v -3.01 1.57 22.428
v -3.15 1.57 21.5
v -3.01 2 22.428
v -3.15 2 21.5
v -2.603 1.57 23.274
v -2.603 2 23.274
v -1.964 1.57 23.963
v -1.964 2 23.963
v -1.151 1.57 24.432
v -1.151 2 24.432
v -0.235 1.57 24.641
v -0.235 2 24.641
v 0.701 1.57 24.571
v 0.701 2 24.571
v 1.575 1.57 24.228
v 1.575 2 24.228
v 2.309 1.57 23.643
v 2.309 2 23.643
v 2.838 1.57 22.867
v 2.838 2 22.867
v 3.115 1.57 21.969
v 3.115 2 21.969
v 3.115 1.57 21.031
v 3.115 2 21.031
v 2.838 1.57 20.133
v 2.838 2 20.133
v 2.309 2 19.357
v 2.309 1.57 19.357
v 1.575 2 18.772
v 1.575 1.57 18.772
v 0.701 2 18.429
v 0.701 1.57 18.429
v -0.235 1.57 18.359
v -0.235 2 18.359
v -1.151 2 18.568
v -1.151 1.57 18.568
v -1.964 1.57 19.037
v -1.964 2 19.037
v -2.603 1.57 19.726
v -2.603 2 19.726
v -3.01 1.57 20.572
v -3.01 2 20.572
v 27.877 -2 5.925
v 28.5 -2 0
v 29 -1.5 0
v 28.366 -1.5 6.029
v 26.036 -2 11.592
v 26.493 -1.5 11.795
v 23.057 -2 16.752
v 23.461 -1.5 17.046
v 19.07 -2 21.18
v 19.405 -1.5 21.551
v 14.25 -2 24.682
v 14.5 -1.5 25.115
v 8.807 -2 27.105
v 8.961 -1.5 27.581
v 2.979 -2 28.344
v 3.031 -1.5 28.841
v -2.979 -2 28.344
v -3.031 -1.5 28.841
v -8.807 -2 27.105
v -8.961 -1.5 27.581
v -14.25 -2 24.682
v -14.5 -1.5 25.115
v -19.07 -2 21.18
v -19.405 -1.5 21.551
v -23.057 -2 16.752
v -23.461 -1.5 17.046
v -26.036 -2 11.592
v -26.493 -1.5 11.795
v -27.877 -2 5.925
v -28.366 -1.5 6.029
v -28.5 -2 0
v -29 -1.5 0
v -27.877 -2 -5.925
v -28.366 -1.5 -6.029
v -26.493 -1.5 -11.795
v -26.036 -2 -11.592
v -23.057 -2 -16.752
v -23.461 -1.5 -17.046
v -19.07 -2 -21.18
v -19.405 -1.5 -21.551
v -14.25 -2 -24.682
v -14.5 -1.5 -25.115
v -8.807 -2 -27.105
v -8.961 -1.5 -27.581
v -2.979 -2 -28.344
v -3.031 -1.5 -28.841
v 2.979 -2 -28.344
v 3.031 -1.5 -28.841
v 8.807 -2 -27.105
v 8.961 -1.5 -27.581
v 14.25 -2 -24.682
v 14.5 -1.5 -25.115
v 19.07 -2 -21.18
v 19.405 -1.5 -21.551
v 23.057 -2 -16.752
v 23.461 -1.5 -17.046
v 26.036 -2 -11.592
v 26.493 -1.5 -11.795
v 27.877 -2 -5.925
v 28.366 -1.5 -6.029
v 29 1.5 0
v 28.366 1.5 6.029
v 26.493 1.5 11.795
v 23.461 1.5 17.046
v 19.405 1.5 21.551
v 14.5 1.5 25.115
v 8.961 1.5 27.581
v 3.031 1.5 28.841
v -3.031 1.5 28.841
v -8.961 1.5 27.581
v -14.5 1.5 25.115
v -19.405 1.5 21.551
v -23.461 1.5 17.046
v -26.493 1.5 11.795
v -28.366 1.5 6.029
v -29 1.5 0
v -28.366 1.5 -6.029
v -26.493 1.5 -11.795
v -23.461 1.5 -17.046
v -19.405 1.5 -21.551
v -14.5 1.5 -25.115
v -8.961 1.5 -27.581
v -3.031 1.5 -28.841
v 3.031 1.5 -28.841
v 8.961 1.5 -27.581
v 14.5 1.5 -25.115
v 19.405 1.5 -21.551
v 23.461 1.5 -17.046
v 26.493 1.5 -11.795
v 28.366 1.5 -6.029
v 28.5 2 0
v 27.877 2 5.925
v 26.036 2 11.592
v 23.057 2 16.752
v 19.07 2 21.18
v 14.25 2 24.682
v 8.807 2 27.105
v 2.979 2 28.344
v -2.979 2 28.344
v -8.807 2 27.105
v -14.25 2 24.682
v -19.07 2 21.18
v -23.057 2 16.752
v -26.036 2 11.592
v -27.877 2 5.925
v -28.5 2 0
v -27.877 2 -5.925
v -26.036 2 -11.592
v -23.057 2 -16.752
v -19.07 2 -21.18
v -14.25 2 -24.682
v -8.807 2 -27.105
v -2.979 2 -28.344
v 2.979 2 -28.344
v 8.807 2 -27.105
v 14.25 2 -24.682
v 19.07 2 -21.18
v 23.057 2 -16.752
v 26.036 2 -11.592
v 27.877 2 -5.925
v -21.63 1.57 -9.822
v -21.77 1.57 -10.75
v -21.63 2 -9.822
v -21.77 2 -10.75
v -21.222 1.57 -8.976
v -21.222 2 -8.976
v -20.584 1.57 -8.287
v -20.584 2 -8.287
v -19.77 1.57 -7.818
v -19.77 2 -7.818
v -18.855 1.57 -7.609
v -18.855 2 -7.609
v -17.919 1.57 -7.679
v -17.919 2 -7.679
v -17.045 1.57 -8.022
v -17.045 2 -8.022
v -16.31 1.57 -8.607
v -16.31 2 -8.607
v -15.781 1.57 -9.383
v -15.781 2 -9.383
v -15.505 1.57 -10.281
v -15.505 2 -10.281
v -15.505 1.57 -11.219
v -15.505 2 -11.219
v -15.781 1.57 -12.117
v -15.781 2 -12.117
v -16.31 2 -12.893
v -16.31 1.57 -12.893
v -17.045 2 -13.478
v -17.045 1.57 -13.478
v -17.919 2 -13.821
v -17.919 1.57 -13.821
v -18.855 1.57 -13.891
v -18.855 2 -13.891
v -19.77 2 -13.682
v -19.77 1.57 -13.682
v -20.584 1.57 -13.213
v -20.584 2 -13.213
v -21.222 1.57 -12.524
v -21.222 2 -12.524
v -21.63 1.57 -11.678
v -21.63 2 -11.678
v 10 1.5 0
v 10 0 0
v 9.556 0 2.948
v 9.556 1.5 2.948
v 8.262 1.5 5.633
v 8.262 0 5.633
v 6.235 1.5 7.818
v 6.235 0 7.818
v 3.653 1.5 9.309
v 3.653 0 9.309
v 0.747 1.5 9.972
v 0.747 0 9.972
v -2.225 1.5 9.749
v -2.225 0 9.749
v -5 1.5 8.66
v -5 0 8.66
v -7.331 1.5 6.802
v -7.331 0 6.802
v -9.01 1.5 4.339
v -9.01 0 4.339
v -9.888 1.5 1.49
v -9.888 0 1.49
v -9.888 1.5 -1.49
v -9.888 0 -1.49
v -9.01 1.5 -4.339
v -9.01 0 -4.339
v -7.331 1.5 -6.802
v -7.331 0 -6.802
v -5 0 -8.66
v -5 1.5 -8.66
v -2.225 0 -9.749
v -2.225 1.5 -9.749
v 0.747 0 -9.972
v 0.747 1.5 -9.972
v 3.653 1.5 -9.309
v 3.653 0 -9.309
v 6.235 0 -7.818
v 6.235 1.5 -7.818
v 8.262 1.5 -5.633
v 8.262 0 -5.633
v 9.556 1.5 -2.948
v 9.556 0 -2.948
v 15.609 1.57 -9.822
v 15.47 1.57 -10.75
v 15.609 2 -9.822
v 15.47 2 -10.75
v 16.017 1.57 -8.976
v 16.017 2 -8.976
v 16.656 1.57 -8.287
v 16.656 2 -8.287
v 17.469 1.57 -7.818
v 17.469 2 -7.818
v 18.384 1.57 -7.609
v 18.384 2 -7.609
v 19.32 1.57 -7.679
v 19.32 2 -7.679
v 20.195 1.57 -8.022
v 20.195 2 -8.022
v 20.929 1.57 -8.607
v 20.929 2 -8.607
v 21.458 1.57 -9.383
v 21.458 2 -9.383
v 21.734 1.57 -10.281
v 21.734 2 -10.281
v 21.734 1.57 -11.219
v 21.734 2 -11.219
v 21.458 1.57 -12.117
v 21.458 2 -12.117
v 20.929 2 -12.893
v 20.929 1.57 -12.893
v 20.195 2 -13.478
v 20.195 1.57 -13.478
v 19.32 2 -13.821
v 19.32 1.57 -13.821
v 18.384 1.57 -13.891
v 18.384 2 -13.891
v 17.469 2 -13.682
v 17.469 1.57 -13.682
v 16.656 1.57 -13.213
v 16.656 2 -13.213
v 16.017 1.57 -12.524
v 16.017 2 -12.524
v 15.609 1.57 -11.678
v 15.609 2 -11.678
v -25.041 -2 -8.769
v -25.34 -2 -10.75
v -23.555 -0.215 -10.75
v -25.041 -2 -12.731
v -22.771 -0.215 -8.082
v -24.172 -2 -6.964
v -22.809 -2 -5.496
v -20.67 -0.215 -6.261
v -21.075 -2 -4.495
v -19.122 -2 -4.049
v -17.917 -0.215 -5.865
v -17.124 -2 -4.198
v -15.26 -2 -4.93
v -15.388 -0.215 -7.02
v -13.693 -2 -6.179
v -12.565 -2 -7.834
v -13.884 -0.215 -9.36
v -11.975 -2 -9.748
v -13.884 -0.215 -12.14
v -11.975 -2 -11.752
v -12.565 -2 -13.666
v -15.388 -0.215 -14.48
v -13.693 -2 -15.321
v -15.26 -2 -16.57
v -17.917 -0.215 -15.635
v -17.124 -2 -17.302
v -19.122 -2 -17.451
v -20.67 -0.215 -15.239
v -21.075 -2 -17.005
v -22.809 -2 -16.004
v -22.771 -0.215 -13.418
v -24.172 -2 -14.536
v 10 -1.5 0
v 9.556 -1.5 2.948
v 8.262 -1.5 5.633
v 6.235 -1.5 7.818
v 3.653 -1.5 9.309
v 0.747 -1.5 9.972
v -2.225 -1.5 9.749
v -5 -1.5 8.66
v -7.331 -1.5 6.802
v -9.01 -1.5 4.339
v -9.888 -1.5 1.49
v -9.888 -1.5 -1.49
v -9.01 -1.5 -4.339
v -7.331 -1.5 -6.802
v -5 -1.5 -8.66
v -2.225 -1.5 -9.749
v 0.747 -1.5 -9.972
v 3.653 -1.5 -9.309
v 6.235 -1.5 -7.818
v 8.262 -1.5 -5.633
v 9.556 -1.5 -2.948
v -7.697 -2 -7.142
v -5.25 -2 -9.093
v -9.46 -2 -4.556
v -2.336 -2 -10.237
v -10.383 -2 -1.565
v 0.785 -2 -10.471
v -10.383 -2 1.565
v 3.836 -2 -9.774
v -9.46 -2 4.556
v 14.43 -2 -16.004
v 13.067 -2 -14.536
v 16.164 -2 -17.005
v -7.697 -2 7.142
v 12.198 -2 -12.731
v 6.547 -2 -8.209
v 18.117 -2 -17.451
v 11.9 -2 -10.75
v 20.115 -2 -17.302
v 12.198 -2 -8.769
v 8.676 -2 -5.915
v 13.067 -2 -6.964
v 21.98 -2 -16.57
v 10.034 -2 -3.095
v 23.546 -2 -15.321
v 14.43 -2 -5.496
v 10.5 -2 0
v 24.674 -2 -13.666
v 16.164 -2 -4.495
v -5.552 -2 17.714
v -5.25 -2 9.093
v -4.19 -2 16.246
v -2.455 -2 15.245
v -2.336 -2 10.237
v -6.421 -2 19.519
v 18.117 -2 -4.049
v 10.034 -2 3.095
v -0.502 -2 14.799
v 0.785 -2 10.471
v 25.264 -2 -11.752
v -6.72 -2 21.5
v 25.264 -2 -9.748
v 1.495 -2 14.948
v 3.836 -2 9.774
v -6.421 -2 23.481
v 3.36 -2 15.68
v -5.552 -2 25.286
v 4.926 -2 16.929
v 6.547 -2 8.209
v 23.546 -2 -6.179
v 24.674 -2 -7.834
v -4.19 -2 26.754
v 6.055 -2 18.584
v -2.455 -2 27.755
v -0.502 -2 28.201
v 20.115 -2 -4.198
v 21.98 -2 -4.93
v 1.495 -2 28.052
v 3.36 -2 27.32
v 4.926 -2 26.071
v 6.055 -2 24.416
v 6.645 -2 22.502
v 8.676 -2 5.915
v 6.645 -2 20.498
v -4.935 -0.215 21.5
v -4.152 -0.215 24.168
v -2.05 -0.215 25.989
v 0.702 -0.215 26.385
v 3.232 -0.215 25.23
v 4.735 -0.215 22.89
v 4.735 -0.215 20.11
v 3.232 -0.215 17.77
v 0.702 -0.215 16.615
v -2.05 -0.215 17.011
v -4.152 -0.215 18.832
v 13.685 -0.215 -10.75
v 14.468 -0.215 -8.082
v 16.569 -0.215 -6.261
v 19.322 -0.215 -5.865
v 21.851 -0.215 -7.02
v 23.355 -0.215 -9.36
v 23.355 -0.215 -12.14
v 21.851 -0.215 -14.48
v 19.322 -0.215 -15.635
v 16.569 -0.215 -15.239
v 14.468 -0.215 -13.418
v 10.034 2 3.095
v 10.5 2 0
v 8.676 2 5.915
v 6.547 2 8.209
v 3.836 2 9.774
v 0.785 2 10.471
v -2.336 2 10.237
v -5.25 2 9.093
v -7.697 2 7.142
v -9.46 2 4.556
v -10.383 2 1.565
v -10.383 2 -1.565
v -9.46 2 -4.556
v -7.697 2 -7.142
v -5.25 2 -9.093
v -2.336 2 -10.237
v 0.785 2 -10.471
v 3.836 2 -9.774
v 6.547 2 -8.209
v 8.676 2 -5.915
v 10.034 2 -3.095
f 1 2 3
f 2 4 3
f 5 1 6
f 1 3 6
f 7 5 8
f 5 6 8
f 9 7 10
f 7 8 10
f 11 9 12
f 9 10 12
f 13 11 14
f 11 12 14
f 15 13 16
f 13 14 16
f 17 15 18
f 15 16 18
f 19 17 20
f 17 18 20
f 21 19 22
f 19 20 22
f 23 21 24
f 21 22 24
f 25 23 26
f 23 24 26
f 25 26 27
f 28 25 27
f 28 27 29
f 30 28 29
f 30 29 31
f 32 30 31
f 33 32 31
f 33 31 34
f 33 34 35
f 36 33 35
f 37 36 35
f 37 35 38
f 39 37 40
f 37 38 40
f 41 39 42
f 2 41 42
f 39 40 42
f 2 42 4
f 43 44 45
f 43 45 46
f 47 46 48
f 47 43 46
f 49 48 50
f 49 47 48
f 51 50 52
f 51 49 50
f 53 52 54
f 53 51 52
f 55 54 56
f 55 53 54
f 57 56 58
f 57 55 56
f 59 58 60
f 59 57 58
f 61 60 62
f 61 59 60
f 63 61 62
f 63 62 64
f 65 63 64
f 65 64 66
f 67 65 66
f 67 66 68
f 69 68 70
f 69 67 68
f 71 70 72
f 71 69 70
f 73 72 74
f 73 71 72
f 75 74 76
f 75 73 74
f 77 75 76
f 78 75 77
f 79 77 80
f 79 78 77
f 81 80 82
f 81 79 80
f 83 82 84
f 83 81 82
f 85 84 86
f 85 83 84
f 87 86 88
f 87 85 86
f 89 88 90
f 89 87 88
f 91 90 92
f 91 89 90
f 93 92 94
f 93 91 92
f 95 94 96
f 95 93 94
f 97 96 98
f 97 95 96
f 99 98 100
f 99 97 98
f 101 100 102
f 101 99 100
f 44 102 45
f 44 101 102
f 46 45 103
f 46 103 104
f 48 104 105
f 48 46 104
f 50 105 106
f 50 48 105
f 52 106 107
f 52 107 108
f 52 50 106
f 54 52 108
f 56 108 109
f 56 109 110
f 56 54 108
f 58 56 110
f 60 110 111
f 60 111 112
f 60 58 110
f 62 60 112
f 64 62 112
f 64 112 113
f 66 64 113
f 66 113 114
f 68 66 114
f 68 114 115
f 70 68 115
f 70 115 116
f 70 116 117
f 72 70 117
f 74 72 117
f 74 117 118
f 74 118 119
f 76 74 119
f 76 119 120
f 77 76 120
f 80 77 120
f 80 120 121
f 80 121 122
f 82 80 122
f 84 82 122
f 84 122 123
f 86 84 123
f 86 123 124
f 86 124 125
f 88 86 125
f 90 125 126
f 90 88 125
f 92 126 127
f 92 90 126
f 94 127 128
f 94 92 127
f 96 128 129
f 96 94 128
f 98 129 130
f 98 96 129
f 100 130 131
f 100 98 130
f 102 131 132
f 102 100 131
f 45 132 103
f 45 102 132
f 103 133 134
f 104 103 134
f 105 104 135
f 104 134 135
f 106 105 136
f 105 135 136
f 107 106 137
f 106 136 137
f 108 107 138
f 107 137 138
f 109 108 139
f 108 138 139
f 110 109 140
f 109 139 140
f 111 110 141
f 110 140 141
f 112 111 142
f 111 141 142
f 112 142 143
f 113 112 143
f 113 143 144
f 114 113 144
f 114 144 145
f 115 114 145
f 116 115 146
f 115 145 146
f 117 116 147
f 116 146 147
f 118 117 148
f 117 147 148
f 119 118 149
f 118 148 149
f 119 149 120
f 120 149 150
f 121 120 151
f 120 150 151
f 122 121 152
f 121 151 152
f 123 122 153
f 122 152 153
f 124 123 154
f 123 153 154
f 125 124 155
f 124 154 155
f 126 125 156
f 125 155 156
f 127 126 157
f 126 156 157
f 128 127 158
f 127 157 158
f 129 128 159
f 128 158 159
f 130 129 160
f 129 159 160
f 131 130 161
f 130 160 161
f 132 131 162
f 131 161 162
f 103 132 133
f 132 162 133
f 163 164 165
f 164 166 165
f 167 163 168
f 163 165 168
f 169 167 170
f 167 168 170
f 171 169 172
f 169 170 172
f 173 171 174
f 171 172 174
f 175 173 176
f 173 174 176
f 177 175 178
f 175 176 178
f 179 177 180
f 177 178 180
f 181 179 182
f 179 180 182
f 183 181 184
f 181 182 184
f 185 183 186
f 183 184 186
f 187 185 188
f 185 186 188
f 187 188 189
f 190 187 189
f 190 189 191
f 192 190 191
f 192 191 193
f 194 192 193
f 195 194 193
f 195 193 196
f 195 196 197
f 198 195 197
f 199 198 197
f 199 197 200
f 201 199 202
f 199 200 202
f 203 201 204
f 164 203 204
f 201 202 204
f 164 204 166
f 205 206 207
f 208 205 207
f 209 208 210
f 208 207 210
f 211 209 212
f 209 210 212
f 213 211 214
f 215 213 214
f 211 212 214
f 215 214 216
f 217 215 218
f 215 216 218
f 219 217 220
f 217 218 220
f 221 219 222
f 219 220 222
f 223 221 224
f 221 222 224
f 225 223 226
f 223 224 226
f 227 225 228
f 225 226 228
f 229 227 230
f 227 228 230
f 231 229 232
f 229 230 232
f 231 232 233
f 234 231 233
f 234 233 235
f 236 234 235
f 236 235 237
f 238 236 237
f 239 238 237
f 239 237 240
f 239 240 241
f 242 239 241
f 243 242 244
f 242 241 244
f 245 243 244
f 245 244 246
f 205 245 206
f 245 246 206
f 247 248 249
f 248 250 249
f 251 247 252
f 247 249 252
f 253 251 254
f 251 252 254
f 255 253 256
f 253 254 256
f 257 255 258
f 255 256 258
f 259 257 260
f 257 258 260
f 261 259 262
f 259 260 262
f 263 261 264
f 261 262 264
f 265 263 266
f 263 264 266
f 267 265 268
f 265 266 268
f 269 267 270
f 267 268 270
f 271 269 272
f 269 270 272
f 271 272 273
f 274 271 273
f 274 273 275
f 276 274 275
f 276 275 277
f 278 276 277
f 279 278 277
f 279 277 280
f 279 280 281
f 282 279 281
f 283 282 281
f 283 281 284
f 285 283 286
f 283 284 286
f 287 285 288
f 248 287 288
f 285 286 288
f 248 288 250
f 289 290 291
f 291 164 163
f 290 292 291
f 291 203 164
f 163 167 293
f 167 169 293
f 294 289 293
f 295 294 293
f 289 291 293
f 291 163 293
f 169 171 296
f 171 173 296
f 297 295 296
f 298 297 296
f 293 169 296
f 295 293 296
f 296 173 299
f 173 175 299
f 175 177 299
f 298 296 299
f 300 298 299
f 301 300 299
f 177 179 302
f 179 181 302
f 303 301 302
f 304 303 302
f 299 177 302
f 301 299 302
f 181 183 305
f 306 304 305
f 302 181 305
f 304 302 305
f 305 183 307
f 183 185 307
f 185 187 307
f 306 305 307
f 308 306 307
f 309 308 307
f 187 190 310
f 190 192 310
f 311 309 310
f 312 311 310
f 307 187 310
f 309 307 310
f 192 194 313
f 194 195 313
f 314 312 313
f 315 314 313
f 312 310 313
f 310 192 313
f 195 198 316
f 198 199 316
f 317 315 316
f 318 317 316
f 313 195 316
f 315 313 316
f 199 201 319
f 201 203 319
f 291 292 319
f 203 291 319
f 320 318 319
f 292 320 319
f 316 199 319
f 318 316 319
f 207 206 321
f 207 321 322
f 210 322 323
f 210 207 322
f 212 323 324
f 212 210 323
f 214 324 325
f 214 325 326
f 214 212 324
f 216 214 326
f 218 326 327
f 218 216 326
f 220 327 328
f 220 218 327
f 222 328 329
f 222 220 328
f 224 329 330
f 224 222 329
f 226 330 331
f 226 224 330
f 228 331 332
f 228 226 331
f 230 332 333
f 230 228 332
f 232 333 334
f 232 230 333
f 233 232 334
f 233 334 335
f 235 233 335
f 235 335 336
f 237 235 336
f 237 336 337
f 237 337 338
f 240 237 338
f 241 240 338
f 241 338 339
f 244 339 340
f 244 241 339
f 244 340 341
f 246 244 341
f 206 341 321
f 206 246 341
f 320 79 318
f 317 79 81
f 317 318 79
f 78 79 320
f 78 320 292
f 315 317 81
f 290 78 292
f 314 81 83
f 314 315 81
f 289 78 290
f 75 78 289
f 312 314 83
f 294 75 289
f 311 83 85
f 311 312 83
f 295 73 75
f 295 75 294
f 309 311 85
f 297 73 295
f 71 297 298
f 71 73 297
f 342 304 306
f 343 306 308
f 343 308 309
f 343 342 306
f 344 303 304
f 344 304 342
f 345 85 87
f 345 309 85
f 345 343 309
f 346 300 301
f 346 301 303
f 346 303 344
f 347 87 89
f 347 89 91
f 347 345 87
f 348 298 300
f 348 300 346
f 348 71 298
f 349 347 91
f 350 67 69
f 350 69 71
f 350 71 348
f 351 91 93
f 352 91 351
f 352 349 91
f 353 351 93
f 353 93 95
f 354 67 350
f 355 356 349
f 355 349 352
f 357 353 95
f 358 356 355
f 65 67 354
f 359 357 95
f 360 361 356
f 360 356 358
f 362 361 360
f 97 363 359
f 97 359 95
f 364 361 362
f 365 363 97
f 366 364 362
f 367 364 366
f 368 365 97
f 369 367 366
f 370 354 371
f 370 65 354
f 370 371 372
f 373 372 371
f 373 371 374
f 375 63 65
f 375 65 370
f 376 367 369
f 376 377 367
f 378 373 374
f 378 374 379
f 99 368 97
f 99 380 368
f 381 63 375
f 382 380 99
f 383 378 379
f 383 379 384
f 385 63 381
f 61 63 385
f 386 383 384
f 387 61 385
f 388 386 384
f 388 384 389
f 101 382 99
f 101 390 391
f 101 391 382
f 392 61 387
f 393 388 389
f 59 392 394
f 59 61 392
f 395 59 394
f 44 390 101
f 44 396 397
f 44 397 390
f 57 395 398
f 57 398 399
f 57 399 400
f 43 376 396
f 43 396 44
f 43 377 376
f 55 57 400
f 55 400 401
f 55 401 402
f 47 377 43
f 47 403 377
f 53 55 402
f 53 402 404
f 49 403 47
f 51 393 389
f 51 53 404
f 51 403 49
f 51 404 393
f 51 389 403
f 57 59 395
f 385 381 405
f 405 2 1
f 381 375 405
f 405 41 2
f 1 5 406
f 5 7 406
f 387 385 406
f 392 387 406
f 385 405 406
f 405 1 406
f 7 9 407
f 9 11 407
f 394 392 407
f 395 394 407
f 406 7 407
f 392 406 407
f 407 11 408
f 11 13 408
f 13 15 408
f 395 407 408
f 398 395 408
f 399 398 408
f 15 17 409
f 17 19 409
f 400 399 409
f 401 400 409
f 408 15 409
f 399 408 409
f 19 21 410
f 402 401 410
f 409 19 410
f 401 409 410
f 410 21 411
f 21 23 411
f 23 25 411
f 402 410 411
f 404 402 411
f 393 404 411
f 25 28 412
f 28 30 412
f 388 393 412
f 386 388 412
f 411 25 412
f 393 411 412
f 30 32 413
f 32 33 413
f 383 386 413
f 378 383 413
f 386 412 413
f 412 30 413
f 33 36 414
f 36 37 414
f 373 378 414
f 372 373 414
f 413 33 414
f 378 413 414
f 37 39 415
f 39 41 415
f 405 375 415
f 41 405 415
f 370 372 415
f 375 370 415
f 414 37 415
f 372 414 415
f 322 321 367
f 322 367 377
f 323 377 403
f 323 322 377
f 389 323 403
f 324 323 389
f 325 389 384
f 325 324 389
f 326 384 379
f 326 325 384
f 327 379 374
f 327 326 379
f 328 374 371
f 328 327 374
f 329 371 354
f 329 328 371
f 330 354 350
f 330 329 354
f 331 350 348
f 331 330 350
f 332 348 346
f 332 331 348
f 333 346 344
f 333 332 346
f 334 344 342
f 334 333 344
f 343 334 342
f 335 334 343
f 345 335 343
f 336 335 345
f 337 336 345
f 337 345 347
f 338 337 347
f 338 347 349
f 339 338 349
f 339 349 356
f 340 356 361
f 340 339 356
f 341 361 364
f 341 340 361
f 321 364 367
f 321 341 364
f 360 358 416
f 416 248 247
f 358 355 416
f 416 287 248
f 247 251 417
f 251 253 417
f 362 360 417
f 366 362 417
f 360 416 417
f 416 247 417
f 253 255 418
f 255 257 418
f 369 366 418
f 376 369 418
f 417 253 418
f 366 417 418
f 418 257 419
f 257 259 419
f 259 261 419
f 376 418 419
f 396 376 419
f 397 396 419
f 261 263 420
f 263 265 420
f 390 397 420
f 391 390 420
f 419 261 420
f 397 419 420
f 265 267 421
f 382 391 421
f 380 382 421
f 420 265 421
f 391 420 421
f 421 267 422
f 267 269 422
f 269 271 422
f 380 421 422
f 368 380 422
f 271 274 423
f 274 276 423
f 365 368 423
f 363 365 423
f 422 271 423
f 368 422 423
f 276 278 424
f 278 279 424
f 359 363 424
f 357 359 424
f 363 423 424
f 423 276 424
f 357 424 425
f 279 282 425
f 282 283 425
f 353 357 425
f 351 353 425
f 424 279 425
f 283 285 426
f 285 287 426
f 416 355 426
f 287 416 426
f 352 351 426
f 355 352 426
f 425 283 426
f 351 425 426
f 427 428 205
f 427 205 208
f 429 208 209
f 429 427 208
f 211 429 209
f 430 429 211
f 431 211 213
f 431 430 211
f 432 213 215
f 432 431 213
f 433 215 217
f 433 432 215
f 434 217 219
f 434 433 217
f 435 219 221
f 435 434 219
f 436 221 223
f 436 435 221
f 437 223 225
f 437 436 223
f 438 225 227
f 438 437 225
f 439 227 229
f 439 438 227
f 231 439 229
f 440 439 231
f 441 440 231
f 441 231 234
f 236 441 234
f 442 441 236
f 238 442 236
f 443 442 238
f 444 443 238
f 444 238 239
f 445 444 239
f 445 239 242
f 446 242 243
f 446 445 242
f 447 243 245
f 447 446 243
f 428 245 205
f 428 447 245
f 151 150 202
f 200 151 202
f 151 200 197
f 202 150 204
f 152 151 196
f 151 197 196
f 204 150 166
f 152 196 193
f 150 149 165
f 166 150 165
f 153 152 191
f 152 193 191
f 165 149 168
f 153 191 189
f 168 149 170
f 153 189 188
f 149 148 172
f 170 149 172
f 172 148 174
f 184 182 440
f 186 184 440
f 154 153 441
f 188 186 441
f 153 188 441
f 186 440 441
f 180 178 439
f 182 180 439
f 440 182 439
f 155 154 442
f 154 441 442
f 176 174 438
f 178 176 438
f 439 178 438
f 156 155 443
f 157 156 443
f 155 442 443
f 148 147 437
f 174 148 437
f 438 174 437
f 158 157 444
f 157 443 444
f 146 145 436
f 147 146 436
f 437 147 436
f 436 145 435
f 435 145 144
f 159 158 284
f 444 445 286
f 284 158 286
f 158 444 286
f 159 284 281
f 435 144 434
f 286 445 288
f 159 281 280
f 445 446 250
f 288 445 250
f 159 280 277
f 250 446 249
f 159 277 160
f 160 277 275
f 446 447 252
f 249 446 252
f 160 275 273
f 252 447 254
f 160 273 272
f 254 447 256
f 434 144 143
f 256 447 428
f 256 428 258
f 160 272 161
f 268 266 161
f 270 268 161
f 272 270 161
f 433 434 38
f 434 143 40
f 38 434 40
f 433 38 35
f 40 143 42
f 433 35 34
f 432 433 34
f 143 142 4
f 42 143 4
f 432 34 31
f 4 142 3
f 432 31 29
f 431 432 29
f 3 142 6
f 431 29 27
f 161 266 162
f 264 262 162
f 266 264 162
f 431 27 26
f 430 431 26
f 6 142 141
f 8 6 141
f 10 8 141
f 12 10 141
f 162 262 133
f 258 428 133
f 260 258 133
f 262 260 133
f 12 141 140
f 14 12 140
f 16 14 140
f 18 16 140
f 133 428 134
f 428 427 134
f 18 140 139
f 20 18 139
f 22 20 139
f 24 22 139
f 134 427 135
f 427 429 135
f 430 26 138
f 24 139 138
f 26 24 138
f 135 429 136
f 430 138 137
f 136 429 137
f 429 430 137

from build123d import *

# Parameters (mm, degrees)
F0_R           = 29
F0_R_2         = 10
F1_DEPTH       = 2
F1_DEPTH_BACK  = 2
F3_D           = 6.3
F3_CSINK_D     = 13.44
F3_CSINK_ANGLE = 90
F4_SIZE        = 0.5


with BuildPart() as f1:
    # F0 (on Front) → F1 (new body, two sides)
    with BuildSketch(Plane.XZ) as f1_sk:
        Circle(F0_R)
        Circle(F0_R_2, mode=Mode.SUBTRACT)
    extrude(amount=F1_DEPTH)
    extrude(f1_sk.sketch, amount=-F1_DEPTH_BACK)

    # F3 (through all)
    with Locations(Plane.XZ.offset(2)):
        with Locations((0, 21.5), (-18.6195461814, -10.75), (18.6195461814, -10.75)):
            CounterSinkHole(F3_D / 2, F3_CSINK_D / 2, counter_sink_angle=F3_CSINK_ANGLE)

    # F4
    f4_edges = [f1.edges().sort_by_distance(p)[0] for p in [
        (-29, -2, 0),
        (29, -1, 0),
        (-29, 0, 0),
        (-10, 2, 0),
        (-10, -2, 0),
    ]]
    chamfer(f4_edges, length=F4_SIZE)


solid = f1.part
